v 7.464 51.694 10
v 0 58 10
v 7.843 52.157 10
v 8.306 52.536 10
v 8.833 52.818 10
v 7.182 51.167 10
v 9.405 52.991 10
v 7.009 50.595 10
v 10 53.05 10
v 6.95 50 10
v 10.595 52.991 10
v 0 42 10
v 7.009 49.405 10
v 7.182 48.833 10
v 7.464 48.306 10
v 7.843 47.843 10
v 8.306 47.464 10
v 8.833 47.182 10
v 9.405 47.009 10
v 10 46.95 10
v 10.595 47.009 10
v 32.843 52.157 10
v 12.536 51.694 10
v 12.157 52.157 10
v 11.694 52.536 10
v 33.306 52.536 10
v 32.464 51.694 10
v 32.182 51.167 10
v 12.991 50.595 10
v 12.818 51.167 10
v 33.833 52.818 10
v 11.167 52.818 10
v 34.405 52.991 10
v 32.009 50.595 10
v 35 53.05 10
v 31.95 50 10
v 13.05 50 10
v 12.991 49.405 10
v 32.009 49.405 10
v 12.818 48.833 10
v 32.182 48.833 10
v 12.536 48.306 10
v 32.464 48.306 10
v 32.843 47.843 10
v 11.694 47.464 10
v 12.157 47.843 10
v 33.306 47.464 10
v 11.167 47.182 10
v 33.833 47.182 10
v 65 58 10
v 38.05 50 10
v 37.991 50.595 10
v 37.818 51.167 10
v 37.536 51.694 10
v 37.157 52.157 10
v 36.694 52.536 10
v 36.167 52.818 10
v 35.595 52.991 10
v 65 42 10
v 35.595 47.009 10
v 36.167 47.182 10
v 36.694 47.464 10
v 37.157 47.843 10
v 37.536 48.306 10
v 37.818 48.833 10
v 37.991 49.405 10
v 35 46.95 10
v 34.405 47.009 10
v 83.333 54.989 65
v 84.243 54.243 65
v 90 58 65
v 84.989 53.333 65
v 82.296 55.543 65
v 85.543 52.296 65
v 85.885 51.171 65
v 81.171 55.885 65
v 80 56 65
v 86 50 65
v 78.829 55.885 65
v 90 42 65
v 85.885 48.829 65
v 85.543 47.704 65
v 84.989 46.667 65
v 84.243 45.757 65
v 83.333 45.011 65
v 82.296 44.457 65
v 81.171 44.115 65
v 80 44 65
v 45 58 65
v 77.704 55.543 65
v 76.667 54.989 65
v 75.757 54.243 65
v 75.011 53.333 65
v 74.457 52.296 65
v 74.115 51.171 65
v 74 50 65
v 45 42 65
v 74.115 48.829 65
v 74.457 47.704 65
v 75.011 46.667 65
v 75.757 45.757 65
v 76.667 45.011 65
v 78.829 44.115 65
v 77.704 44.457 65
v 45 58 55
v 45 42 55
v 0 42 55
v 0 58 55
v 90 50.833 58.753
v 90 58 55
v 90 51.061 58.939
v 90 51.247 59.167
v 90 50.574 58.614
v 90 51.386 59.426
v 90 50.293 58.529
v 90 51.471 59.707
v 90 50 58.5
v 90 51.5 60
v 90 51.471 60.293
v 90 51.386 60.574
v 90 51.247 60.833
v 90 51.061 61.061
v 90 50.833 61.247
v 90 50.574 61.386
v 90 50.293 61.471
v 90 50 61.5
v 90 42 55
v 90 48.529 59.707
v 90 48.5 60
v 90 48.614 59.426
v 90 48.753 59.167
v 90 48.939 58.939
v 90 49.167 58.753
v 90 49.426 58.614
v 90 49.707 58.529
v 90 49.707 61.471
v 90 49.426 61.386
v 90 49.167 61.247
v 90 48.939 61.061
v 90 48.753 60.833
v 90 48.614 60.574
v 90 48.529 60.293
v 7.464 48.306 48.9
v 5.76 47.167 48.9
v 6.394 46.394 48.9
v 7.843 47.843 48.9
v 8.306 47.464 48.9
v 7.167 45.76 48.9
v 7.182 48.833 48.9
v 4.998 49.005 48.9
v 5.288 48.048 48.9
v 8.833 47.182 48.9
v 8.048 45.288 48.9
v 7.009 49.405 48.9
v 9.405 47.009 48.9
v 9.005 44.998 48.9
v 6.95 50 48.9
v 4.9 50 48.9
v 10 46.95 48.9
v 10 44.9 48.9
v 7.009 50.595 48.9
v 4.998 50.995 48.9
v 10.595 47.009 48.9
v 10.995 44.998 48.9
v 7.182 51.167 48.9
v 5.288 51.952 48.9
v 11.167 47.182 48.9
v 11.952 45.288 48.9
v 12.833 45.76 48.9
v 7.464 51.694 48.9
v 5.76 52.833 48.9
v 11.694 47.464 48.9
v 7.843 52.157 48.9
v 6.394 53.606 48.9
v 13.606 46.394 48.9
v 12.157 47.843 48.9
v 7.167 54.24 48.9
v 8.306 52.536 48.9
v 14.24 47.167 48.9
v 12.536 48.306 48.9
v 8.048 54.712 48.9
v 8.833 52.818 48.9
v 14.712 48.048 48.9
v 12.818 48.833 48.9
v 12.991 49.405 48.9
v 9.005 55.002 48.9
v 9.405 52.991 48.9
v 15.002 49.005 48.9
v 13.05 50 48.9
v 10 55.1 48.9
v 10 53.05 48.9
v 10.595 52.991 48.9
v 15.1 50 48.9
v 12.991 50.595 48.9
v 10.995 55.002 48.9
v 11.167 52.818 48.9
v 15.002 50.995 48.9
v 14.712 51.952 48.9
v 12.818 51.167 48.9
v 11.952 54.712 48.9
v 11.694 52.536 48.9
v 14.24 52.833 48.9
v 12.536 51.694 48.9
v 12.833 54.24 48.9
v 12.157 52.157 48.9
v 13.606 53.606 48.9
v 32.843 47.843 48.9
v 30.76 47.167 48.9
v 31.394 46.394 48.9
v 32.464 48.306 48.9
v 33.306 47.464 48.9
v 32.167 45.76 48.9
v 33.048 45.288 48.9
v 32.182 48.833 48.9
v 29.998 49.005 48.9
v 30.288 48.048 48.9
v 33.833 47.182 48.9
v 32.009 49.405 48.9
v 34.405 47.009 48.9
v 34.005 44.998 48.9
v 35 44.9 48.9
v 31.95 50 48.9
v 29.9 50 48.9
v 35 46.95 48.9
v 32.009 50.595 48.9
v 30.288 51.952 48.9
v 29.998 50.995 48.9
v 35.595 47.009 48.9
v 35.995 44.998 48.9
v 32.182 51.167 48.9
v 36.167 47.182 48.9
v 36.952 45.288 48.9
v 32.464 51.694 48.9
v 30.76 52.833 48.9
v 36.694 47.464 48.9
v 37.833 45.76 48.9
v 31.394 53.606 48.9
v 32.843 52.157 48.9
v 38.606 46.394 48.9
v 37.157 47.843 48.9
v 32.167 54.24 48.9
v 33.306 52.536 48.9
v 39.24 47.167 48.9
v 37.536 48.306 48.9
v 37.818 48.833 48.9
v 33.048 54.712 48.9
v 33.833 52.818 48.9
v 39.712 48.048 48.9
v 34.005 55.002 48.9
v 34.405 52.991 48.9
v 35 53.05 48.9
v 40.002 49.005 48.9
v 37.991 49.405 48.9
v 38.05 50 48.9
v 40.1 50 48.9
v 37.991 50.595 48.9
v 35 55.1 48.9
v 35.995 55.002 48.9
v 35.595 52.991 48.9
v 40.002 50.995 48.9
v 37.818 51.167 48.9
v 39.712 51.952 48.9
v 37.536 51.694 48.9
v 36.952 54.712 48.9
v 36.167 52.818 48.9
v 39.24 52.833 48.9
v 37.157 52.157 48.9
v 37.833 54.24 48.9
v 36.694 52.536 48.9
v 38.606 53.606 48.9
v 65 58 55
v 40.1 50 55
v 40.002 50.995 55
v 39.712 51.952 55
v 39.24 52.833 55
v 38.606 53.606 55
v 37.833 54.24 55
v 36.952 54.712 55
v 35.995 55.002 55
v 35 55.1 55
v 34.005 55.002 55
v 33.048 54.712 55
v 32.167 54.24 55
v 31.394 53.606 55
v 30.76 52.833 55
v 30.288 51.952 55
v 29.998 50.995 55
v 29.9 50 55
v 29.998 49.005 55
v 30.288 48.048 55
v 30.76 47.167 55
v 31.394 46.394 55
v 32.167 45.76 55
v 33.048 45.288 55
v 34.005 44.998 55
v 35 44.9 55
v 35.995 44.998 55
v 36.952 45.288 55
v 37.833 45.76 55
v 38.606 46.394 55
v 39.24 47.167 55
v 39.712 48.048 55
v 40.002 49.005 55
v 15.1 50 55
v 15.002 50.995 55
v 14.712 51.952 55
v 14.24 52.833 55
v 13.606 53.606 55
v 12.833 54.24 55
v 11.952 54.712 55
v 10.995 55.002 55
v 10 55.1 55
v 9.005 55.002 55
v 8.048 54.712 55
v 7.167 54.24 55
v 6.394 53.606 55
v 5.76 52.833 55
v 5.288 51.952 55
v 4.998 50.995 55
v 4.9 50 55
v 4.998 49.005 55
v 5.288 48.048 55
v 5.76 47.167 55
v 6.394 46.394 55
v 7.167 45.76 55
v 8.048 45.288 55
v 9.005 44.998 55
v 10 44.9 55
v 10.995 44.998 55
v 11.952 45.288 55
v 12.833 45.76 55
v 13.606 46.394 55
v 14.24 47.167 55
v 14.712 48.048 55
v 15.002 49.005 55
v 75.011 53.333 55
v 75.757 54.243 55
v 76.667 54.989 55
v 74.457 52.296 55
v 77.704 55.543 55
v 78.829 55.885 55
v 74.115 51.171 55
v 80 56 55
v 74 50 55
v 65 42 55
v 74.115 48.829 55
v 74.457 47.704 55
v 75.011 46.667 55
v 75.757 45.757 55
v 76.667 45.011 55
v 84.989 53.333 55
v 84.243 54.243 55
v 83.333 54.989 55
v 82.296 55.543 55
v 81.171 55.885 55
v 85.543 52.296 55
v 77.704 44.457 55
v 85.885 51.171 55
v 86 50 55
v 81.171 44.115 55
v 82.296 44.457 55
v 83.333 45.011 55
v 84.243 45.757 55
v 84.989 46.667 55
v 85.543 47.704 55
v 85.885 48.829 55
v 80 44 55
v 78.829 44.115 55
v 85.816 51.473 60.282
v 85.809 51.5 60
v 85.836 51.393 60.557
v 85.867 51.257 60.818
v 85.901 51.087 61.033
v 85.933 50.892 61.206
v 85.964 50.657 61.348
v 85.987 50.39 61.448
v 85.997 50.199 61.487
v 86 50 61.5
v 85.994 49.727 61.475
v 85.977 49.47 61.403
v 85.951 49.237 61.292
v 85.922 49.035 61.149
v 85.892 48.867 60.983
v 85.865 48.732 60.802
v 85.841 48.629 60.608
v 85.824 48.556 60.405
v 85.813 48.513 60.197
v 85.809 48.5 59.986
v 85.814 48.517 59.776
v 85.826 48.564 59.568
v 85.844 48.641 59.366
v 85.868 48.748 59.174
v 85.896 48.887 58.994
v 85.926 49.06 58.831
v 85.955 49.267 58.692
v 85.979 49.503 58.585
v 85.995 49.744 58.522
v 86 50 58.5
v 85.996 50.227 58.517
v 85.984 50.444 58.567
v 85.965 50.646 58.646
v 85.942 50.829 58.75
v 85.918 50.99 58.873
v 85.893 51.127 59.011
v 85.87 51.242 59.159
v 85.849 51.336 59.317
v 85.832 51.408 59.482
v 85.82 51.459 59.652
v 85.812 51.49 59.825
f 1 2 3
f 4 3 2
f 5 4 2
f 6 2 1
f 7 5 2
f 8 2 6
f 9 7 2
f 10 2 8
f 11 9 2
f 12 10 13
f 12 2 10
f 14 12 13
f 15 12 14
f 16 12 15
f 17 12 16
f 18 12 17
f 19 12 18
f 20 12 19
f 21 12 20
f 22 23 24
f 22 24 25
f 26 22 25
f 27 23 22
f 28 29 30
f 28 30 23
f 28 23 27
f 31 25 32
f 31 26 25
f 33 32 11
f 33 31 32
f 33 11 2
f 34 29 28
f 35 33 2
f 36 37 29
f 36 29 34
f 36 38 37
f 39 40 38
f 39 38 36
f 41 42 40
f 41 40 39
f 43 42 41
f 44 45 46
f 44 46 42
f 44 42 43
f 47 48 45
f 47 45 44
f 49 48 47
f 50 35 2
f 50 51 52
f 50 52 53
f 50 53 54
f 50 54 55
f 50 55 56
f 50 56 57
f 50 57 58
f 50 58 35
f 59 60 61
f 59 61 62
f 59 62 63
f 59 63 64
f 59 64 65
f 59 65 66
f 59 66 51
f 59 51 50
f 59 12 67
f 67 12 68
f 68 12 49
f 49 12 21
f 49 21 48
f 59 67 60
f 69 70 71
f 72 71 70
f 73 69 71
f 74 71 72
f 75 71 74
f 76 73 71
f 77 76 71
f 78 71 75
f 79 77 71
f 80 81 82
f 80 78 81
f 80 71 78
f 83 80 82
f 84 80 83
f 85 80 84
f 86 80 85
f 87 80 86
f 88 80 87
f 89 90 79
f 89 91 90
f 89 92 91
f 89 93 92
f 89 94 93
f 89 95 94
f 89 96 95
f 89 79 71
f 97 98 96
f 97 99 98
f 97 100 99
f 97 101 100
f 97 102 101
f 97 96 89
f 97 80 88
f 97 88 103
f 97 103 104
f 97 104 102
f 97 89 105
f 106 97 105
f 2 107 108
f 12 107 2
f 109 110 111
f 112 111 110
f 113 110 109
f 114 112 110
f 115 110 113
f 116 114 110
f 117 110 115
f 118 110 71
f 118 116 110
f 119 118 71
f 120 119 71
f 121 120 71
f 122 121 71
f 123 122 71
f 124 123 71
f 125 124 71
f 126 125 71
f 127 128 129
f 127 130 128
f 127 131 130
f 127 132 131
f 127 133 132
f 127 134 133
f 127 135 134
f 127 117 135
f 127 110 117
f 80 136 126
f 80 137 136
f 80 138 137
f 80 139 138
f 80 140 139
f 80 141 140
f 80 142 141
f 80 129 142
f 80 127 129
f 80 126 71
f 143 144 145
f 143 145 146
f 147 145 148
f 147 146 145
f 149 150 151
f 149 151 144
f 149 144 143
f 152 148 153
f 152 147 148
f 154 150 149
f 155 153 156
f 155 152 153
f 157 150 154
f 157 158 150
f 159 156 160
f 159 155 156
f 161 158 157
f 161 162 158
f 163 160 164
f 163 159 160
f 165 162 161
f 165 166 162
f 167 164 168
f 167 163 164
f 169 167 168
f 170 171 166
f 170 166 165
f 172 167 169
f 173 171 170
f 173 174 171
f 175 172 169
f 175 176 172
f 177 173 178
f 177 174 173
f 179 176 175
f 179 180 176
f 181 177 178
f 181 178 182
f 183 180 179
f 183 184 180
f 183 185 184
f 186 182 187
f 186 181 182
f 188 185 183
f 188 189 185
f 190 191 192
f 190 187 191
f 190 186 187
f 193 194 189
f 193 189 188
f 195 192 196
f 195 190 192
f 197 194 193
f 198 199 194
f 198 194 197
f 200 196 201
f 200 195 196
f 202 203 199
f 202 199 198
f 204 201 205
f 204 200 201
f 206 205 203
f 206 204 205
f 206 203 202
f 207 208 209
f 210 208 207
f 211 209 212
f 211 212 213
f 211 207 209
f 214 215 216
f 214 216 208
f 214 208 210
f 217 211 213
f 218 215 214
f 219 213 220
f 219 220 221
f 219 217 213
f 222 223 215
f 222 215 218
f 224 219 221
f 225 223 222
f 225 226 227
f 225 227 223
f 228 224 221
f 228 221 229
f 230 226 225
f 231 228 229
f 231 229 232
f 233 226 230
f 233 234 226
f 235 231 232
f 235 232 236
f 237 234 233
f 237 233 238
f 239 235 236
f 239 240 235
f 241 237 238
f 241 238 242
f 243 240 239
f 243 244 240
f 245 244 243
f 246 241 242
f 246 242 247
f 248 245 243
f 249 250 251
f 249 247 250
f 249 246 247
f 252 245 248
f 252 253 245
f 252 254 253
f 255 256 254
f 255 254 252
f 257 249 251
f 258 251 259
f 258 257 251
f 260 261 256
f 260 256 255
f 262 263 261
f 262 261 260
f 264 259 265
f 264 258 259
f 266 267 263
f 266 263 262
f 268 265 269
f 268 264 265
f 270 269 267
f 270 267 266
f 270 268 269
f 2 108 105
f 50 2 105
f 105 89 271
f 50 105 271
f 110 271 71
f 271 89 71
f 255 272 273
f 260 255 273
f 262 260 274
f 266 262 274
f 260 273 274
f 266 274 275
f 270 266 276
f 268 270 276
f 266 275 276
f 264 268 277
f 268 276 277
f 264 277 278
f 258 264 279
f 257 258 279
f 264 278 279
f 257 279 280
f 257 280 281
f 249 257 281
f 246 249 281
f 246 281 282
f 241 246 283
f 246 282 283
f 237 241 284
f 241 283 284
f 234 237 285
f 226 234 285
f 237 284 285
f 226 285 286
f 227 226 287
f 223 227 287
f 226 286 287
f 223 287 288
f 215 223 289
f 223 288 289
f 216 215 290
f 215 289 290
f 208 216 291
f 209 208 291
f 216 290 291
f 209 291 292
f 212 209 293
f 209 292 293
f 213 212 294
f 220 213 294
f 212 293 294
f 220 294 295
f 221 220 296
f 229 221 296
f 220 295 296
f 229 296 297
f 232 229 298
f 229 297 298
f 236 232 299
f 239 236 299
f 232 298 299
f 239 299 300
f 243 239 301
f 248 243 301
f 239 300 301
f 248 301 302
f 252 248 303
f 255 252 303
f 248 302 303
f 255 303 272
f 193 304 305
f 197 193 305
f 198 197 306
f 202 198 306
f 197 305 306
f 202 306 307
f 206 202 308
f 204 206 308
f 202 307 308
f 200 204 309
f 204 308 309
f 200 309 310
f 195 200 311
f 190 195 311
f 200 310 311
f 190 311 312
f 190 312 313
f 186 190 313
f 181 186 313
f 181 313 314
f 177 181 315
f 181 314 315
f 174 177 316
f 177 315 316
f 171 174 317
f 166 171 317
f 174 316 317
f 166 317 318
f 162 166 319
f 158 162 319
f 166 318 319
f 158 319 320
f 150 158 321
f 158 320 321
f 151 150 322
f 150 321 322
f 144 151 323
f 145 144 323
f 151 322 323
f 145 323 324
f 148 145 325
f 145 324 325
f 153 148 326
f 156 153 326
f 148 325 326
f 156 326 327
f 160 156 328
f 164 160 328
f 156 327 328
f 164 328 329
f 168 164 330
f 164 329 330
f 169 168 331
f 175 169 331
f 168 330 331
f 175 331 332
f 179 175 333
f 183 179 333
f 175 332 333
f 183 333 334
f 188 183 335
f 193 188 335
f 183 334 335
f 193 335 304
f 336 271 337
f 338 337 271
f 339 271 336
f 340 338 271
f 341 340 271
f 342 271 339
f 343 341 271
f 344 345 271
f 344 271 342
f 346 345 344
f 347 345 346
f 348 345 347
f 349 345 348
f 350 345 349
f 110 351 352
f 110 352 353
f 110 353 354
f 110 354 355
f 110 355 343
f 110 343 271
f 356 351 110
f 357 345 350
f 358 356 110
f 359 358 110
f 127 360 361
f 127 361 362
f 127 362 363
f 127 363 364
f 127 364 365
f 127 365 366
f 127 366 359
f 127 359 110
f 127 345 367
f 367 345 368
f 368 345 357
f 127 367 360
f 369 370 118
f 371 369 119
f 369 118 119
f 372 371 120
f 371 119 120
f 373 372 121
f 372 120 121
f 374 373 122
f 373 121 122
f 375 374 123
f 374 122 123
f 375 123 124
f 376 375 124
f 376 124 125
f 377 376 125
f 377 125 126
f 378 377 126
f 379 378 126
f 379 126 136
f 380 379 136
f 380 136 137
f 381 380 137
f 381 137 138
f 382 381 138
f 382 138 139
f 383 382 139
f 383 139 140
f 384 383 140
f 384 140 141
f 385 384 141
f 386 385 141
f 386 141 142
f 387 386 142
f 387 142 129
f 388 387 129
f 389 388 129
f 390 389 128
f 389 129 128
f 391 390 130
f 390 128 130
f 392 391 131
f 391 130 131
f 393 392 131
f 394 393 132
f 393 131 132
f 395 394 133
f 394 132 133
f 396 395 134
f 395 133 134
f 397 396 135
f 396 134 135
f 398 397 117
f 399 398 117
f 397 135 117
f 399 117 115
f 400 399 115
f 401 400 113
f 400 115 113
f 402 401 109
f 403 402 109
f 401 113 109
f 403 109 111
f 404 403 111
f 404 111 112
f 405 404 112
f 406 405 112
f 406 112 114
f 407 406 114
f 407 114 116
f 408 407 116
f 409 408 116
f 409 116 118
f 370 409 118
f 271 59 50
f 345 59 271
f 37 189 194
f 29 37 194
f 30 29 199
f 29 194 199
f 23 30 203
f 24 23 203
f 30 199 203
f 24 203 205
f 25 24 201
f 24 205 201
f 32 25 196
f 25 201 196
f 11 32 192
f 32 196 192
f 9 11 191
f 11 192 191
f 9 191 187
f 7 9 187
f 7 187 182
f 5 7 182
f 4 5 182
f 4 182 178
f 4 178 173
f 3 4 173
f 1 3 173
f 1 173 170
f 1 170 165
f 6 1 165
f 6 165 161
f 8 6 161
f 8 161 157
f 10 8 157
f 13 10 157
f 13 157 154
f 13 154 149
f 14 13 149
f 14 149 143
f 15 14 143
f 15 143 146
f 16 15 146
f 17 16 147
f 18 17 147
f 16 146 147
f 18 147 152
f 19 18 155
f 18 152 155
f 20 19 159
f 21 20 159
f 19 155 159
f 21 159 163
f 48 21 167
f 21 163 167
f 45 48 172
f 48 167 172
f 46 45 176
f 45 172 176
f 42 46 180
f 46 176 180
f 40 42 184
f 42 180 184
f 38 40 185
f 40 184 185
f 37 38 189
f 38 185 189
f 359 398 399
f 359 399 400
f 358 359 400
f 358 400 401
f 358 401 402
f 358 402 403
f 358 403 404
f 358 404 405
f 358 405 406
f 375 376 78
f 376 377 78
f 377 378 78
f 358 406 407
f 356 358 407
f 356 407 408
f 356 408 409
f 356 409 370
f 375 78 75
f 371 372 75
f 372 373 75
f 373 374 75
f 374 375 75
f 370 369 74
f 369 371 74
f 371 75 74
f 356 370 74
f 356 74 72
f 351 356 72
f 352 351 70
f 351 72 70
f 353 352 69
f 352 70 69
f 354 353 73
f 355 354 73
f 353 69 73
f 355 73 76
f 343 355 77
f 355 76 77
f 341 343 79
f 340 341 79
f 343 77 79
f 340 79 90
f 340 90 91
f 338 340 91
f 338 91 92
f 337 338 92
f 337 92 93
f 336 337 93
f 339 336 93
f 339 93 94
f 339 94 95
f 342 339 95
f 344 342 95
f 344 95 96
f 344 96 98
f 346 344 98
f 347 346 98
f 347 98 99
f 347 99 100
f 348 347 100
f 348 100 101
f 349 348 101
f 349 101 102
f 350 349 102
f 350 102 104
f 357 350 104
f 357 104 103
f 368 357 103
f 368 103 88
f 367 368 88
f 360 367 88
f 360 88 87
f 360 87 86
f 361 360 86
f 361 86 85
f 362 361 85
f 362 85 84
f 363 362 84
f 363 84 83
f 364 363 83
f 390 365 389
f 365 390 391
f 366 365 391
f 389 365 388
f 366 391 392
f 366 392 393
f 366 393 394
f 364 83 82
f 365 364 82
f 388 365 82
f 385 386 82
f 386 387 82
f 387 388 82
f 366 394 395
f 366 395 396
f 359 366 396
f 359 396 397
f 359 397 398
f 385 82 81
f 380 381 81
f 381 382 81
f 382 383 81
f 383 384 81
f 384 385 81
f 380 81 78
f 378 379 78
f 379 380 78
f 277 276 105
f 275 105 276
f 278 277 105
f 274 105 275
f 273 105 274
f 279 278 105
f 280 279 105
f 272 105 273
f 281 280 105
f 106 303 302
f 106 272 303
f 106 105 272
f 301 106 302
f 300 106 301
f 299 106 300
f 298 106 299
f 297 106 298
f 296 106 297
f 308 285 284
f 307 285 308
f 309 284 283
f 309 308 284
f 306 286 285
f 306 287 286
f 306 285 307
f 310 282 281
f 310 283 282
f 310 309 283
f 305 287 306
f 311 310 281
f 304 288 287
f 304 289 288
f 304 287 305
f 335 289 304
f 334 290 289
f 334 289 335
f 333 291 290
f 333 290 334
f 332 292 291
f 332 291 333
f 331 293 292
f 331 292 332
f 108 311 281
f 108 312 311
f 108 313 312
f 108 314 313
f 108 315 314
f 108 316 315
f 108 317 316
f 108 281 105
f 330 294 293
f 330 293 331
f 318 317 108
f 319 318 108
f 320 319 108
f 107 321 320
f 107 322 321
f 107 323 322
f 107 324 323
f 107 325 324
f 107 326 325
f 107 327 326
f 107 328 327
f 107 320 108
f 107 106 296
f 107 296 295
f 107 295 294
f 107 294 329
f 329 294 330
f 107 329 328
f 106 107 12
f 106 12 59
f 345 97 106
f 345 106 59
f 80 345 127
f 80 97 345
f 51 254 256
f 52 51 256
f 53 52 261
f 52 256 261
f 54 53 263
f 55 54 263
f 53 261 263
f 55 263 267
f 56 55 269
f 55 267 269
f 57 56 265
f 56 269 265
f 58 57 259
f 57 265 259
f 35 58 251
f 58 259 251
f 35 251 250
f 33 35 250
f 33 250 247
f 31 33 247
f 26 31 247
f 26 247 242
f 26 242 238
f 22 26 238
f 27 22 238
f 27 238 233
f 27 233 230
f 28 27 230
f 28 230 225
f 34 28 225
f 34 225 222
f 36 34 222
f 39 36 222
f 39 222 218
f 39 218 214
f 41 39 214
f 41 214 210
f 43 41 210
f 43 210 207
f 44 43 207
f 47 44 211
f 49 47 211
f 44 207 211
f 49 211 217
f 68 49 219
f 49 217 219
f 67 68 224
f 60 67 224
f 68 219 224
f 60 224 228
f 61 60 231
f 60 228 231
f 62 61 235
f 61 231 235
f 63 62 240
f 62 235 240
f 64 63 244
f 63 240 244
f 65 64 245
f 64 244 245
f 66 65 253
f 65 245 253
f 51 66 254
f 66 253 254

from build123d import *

# Parameters (mm, degrees)
F2_DEPTH  = 8
F3_R      = 3.05
F4_DEPTH  = 45
F5_R      = 5.1
F6_DEPTH  = 6.1
F7_R      = 6
F8_DEPTH  = 10
F9_R      = 1.5
F10_DEPTH = 4.1915250807


with BuildPart() as f2:
    # F1 (on offset) → F2 (new body, symmetric)
    with BuildSketch(Plane.XZ.offset(-50)):
        Polygon((0, 55), (0, 10), (65, 10), (65, 55), (90, 55), (90, 65), (45, 65), (45, 55), align=None)
    extrude(amount=F2_DEPTH, both=True)

    # F3 (on face) → F4 (cut, through all)
    with BuildSketch(Plane.XY.offset(55)):
        with Locations((10, 50)):
            Circle(F3_R)
        with Locations((35, 50)):
            Circle(F3_R)
    extrude(amount=-F4_DEPTH, mode=Mode.SUBTRACT)

    # F5 (on face) → F6 (cut)
    with BuildSketch(Plane.XY.offset(55)):
        with Locations((10, 50)):
            Circle(F5_R)
        with Locations((35, 50)):
            Circle(F5_R)
    extrude(amount=-F6_DEPTH, mode=Mode.SUBTRACT)

    # F7 (on face) → F8 (cut, through all)
    with BuildSketch(Plane.XY.offset(65)):
        with Locations((80, 50)):
            Circle(F7_R)
    extrude(amount=-F8_DEPTH, mode=Mode.SUBTRACT)

    # F9 (on face) → F10 (cut, through all)
    with BuildSketch(Plane.YZ.offset(90)):
        with Locations((50, 60)):
            Circle(F9_R)
    extrude(amount=-F10_DEPTH, mode=Mode.SUBTRACT)


solid = f2.part
